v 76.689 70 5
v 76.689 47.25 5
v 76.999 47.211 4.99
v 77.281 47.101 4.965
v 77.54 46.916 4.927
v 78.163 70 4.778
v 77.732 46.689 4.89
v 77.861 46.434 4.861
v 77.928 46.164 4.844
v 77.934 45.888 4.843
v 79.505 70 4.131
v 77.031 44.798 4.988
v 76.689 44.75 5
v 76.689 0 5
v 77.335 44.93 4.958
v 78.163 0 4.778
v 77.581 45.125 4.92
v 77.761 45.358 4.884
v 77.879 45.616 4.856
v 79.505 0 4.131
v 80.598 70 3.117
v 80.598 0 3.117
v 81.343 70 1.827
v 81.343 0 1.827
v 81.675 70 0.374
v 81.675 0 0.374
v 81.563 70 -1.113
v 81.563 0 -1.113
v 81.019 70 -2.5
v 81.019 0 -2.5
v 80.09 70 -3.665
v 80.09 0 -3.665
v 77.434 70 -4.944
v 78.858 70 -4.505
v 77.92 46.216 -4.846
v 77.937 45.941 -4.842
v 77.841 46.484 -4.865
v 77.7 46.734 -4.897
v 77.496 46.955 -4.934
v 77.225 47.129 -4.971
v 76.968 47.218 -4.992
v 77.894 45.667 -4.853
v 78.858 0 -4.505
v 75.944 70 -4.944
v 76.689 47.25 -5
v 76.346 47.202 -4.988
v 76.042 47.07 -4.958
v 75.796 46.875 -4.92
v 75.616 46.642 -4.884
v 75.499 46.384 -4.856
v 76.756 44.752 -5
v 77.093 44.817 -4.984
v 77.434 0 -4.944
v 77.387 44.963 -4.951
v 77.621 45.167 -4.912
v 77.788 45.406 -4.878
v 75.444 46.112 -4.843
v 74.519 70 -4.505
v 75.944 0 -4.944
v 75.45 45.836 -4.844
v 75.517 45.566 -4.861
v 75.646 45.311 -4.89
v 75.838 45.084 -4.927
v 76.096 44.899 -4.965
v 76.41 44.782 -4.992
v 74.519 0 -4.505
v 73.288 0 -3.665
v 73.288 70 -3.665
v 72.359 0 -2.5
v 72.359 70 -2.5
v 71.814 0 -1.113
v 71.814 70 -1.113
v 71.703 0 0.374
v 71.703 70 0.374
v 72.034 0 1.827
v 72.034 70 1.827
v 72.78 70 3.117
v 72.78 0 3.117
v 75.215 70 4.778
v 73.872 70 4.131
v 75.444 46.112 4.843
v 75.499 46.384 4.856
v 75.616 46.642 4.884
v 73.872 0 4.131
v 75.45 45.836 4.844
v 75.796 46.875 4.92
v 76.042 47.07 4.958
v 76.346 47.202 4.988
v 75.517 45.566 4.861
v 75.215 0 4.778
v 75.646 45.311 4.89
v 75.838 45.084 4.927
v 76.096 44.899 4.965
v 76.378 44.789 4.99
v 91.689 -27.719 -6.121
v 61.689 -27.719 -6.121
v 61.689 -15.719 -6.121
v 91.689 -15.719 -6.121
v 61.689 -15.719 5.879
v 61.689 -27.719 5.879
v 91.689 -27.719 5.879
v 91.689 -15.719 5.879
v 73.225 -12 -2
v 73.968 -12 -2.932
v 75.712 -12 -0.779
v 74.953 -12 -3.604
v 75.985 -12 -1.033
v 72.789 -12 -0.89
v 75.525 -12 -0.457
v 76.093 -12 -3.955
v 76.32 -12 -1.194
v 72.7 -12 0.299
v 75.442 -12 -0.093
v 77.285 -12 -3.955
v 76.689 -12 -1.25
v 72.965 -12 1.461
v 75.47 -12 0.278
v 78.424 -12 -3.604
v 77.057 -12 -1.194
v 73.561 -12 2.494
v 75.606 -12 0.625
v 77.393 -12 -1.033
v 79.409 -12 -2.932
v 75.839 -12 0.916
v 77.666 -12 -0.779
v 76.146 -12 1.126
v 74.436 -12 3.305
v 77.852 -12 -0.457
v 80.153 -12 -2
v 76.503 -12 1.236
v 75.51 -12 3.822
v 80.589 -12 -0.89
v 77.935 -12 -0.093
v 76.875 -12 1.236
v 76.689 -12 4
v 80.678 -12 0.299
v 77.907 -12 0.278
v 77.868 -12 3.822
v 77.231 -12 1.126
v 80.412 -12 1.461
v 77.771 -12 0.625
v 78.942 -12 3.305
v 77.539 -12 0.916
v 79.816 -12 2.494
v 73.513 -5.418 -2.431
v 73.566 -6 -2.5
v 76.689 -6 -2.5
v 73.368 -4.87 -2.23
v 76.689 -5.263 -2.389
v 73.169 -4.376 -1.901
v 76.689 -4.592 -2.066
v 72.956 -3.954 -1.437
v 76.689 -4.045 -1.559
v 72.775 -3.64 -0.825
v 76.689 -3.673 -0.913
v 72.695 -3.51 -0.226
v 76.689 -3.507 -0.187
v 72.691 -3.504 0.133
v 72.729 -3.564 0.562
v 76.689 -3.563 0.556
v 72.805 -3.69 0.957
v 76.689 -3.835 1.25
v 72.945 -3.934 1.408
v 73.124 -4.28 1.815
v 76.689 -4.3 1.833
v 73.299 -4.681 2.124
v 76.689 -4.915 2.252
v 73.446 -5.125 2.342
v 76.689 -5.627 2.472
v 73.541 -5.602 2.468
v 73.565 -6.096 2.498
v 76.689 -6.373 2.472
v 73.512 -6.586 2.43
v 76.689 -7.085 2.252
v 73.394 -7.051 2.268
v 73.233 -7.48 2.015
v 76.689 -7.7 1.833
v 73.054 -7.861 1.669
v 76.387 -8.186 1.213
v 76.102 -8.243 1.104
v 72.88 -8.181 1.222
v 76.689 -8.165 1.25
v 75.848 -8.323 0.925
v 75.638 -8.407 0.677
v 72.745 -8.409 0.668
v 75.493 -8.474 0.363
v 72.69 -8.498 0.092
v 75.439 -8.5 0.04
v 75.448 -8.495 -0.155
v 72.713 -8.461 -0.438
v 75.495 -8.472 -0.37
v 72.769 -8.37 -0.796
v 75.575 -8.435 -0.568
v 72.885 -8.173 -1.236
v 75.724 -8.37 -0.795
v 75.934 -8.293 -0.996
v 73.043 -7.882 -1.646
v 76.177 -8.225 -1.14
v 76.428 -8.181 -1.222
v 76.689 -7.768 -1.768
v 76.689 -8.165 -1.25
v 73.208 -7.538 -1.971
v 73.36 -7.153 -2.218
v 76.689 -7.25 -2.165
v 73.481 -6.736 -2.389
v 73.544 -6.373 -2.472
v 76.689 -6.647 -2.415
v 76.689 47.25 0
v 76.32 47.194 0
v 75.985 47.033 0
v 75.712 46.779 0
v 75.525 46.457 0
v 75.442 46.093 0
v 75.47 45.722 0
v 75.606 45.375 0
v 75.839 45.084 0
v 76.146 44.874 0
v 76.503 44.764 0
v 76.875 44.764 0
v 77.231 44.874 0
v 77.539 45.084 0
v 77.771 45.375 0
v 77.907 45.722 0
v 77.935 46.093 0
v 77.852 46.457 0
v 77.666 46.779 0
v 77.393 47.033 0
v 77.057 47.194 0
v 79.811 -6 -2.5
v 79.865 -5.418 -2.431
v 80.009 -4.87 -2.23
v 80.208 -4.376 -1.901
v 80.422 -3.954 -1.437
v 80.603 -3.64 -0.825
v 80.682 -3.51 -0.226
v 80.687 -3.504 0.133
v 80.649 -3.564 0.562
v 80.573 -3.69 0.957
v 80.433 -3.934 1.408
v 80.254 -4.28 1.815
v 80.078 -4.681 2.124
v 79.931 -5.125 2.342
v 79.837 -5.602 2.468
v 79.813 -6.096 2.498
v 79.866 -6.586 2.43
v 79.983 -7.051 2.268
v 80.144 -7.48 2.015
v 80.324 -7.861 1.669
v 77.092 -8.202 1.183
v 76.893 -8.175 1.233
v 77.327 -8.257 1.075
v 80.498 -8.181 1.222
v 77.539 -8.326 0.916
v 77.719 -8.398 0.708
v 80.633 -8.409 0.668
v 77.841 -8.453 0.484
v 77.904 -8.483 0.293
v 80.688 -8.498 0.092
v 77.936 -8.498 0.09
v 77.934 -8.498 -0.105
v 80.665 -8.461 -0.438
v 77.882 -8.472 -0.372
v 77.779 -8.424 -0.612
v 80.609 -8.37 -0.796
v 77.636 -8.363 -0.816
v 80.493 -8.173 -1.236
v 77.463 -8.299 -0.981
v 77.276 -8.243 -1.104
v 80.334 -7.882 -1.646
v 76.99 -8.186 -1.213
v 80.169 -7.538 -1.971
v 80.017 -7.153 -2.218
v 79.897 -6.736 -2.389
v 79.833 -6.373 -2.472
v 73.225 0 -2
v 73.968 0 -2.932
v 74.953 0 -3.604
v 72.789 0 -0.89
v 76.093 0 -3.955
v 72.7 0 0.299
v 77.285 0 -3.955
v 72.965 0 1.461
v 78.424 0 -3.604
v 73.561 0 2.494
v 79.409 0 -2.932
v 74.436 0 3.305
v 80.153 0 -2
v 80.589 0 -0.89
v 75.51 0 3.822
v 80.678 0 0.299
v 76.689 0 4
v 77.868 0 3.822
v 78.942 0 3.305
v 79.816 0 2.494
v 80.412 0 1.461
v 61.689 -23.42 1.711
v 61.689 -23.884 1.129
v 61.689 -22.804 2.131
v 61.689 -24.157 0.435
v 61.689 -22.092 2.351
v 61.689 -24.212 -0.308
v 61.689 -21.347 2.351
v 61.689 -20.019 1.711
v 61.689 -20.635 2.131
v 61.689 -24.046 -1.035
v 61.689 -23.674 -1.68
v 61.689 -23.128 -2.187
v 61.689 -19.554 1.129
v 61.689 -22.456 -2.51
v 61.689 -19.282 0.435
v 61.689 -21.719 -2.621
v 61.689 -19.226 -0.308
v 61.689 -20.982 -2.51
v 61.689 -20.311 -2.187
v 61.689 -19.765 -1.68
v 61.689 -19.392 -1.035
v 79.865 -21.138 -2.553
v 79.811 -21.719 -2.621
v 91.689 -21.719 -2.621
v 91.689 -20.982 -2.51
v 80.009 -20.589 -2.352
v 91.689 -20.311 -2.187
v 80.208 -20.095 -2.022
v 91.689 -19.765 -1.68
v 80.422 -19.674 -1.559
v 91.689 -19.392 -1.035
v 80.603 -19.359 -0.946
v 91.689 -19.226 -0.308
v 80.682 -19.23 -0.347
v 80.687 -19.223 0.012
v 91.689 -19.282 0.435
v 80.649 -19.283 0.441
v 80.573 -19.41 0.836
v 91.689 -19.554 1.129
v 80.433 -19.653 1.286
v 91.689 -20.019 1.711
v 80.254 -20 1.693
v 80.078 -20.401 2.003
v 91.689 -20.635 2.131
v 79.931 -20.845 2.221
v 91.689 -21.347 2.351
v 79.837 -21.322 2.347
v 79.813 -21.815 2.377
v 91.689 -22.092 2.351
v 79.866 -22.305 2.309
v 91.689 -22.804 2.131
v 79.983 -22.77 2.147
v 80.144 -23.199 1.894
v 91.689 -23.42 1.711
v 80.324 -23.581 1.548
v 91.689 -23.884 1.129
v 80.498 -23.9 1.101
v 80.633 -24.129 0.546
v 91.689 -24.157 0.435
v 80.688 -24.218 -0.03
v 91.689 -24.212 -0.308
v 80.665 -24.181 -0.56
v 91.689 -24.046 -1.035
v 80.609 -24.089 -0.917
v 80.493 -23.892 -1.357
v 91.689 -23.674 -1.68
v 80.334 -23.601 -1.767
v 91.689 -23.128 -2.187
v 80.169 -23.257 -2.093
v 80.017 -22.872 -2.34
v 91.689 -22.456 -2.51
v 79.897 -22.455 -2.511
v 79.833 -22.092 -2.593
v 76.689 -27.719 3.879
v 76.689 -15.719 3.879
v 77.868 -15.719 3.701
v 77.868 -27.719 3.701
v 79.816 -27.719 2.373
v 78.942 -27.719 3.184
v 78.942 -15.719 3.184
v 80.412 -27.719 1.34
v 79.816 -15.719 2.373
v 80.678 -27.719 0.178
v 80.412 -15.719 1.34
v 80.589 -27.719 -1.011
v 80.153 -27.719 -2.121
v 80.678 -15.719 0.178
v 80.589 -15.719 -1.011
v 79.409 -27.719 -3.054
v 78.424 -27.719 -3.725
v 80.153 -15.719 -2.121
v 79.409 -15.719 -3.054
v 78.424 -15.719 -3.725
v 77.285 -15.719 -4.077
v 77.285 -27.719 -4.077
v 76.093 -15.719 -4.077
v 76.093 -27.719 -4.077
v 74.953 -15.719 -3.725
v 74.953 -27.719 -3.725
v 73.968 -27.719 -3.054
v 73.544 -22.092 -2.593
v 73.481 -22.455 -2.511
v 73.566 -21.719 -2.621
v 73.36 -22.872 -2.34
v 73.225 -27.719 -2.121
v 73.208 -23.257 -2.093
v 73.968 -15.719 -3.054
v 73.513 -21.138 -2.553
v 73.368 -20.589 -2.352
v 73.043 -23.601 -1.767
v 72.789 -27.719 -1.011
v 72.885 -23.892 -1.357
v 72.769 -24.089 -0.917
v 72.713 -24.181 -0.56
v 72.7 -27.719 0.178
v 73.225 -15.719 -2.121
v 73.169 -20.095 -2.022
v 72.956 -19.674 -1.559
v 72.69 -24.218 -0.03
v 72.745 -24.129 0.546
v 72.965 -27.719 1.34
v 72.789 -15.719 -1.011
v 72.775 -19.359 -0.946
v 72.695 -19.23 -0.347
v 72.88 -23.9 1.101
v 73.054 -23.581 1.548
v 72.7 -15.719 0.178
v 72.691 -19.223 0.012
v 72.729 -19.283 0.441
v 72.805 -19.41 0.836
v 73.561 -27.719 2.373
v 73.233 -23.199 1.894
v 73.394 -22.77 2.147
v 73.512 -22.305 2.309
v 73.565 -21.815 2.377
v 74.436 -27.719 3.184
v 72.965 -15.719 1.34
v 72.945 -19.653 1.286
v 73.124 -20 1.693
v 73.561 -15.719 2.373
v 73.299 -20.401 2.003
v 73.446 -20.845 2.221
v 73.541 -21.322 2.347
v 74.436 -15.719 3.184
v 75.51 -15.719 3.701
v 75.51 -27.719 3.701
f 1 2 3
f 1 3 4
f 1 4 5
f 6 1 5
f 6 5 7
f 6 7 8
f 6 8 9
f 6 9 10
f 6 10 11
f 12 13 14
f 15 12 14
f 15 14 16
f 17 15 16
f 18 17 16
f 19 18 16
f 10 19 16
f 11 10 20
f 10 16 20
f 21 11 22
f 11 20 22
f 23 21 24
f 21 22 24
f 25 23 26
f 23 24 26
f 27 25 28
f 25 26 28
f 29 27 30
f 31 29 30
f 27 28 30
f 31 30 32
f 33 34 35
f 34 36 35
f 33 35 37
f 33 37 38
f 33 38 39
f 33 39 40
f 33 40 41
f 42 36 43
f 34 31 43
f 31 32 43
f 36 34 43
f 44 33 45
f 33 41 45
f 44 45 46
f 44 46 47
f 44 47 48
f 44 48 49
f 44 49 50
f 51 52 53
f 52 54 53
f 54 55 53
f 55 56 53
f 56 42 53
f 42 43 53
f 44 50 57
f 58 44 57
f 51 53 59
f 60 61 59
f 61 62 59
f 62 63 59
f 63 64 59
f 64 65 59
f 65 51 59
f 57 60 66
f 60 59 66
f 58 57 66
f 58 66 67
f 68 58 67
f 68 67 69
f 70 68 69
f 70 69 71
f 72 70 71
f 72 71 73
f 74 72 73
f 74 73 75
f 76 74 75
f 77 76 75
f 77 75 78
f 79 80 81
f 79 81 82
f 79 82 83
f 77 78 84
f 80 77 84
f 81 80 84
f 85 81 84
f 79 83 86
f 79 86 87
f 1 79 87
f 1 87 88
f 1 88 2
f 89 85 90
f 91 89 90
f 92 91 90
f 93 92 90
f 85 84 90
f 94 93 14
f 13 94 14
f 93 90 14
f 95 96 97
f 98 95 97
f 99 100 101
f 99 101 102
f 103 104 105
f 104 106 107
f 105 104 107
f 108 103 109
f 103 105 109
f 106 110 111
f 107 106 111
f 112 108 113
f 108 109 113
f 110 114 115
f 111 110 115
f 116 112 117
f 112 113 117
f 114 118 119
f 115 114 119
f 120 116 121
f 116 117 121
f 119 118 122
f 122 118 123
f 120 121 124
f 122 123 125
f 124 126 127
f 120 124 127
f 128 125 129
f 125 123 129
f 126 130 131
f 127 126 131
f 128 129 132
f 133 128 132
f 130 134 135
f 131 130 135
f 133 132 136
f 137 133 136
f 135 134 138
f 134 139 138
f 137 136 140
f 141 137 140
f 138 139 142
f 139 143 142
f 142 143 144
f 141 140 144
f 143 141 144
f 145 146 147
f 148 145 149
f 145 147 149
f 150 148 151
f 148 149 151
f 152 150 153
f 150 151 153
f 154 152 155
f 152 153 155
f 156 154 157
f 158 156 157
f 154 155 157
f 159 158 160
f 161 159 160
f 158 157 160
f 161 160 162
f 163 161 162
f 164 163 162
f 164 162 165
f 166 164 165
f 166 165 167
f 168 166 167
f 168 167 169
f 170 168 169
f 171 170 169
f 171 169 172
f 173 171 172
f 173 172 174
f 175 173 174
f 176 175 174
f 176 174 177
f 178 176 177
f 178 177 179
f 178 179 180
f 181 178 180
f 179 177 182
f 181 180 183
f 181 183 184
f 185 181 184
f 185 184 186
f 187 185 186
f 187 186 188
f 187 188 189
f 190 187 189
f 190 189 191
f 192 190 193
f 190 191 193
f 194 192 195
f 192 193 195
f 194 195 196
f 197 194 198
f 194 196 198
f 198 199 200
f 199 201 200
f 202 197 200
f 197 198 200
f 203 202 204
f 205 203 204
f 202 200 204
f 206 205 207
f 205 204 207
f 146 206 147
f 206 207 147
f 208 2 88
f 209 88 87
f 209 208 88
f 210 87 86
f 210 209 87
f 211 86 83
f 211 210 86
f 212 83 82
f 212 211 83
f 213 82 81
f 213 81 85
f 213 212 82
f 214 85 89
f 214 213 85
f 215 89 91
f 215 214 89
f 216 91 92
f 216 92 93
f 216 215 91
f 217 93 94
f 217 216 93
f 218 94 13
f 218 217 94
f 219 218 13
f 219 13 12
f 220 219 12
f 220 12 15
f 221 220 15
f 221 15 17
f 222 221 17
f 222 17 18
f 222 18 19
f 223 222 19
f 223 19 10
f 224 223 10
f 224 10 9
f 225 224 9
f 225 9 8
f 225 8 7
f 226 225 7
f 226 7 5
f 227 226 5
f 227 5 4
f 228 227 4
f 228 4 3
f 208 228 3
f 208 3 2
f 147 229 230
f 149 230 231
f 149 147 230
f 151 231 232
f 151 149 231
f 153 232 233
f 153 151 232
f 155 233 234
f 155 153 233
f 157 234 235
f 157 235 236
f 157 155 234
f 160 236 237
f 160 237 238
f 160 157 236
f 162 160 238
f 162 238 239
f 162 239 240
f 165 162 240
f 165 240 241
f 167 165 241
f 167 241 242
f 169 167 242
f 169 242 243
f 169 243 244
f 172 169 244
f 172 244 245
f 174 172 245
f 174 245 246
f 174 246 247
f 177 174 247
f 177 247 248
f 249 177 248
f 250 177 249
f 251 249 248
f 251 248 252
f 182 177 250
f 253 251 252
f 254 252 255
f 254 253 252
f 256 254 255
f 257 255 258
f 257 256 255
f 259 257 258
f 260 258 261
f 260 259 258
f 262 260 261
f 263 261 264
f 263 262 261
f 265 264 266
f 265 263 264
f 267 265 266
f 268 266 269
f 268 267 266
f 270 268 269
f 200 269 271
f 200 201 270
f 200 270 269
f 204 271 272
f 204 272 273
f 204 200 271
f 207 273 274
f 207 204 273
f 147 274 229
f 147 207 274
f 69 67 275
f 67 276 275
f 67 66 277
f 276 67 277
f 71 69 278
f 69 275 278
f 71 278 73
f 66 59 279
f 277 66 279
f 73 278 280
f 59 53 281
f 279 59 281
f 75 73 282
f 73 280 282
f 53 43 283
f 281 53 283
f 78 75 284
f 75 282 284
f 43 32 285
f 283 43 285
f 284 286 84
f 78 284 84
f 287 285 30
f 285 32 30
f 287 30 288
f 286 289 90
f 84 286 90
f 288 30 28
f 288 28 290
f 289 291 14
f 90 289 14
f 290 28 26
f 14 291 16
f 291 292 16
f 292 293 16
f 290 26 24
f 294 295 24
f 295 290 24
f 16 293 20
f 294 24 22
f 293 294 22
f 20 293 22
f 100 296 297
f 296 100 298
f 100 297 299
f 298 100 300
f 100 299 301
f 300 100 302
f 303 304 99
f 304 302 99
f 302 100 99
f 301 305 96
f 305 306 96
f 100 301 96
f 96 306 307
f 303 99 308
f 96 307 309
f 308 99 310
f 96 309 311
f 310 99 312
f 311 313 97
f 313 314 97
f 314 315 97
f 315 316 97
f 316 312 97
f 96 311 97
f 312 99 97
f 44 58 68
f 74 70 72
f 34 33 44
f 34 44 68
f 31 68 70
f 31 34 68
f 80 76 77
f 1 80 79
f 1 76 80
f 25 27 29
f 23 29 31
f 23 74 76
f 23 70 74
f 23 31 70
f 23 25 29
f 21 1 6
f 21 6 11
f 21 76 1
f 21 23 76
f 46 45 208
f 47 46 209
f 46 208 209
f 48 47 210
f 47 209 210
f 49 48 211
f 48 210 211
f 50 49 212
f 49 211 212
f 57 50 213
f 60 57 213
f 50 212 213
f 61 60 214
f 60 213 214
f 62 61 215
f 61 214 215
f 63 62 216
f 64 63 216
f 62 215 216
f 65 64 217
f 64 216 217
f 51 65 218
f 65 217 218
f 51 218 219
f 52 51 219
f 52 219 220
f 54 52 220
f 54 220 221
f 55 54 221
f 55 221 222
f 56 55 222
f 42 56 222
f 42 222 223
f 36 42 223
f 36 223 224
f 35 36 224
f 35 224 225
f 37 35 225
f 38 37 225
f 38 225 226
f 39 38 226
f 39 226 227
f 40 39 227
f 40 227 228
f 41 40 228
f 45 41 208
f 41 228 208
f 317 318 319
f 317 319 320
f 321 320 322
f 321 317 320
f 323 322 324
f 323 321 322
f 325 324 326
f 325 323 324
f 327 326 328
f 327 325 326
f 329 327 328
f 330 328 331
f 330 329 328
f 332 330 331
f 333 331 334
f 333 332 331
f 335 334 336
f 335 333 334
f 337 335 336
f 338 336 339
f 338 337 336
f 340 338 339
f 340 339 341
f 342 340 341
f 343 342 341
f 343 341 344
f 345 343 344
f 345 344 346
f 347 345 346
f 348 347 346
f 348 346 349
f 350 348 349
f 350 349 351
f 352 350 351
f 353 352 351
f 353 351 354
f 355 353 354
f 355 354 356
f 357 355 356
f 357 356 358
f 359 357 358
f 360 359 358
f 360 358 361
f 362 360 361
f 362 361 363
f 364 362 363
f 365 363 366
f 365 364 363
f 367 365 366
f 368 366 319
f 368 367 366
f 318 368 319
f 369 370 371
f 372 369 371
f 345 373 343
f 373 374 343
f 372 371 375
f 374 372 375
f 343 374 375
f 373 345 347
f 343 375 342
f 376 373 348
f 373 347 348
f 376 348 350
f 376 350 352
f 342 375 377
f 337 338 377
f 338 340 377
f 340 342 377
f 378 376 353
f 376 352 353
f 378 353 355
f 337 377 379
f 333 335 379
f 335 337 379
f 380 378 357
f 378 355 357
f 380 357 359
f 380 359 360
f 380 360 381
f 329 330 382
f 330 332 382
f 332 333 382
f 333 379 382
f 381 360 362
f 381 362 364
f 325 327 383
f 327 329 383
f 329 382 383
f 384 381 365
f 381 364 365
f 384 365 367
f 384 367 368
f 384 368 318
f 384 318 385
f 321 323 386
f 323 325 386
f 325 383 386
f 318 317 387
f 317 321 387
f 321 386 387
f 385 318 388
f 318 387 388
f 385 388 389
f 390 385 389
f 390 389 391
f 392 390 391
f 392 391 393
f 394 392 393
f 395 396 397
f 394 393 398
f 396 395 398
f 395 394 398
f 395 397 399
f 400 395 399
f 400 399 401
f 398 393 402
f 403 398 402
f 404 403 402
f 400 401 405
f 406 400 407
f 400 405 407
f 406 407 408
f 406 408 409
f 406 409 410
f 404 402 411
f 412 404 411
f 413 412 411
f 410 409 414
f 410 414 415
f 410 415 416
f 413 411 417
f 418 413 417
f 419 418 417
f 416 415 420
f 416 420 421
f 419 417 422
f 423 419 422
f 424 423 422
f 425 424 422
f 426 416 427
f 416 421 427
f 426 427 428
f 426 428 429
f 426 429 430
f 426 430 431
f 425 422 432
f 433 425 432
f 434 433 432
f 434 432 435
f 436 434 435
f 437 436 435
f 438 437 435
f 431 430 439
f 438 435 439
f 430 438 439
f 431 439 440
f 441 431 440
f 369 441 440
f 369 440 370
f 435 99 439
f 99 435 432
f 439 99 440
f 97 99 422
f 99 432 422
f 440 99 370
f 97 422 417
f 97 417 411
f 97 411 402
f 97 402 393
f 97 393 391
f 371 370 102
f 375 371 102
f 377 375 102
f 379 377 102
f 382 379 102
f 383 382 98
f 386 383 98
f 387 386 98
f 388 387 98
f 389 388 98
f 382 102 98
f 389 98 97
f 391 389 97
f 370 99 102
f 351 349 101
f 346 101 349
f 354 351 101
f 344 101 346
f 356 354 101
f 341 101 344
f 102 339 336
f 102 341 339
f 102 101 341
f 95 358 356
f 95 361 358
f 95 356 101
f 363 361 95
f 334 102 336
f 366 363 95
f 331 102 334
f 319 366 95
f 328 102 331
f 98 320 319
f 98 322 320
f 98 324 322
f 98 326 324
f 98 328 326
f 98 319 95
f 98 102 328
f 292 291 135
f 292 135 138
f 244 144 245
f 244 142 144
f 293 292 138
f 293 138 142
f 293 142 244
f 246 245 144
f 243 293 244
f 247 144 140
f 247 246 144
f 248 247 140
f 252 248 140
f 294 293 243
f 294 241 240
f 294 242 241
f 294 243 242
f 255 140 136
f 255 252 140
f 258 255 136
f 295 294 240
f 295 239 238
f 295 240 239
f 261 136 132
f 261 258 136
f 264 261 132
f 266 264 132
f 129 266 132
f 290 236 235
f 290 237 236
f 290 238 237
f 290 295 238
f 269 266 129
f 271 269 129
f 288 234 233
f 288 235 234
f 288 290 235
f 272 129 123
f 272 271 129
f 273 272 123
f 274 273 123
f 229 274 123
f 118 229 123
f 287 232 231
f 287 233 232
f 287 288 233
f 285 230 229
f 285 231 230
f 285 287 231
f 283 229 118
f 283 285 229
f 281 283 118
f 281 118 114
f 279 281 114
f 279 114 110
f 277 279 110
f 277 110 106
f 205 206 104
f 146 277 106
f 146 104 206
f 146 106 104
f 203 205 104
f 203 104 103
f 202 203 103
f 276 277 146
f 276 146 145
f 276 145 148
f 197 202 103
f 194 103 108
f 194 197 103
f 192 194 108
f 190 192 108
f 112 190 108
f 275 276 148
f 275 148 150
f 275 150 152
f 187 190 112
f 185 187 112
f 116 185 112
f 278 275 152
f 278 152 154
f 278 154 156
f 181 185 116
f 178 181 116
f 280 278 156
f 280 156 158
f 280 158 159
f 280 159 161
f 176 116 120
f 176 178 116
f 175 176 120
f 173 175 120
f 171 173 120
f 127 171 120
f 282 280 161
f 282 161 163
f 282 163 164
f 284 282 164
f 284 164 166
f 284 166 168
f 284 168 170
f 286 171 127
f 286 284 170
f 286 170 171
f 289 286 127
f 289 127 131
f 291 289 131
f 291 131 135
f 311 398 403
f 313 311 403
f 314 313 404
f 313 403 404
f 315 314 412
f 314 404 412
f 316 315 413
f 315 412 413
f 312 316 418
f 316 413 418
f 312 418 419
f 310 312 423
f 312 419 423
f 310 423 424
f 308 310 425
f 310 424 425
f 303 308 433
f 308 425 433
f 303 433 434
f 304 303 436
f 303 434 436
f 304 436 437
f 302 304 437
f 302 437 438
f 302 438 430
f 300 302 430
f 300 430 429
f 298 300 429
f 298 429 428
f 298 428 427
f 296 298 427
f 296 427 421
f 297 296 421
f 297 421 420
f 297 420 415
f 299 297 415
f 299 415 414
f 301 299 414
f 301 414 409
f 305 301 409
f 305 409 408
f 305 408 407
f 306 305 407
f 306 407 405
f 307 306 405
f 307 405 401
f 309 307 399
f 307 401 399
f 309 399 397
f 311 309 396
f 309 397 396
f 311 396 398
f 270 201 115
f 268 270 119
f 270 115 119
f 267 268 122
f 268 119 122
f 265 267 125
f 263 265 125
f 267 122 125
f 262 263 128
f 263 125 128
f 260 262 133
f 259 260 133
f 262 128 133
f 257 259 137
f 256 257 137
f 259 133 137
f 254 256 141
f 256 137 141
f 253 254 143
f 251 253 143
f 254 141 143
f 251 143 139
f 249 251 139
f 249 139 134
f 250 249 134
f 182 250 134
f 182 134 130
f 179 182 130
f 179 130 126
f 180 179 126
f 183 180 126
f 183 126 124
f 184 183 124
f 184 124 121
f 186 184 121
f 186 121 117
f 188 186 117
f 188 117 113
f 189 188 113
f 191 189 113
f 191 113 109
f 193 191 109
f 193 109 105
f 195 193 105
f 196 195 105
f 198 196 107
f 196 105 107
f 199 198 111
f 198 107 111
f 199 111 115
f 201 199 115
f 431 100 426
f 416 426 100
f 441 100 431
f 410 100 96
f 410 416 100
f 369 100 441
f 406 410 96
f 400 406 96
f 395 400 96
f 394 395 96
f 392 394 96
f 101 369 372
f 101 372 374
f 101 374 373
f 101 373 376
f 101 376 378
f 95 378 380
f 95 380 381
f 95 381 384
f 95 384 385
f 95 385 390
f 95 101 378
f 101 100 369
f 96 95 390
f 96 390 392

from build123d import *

# Parameters (mm, degrees)
ESQUISSE5_R                  = 4
BOSS_EXTRU_3_DEPTH           = 12
ESQUISSE6_R                  = 5
BOSS_EXTRU_4_DEPTH           = 70
ESQUISSE7_R                  = 2.5
ENL_V_MAT_EXTRU_3_DEPTH      = 10
ENL_V_MAT_EXTRU_3_DEPTH_BACK = 10
ESQUISSE8_R                  = 1.25
ENL_V_MAT_EXTRU_4_DEPTH      = 4
ESQUISSE9_W                  = 12
ESQUISSE9_H                  = 12
ESQUISSE9_R                  = 2.5
BOSS_EXTRU_5_DEPTH           = 15
BOSS_EXTRU_5_DEPTH_BACK      = 15
ESQUISSE10_R                 = 4
ENL_V_MAT_EXTRU_5_DEPTH      = 15
ESQUISSE11_R                 = 1.25
ENL_V_MAT_EXTRU_6_DEPTH      = 10
ENL_V_MAT_EXTRU_6_DEPTH_BACK = 10


with BuildPart() as part:
    # Esquisse5 → Boss.-Extru.3 (new body)
    with BuildSketch(Plane(origin=(0, 0, 0), x_dir=(1, 0, 0), z_dir=(0, 1, 0))):
        with Locations(Location((76.688805558, 0, 0), (0, 0, 270))):  # turned: the seam where the file's is
            Circle(ESQUISSE5_R)
    extrude(amount=-BOSS_EXTRU_3_DEPTH)

    # Esquisse6 → Boss.-Extru.4 (add)
    with BuildSketch(Plane(origin=(0, 0, 0), x_dir=(1, 0, 0), z_dir=(0, 1, 0))):
        with Locations(Location((76.688805558, 0, 0), (0, 0, 270))):  # turned: the seam where the file's is
            Circle(ESQUISSE6_R)
    extrude(amount=BOSS_EXTRU_4_DEPTH)

    # Esquisse7 → Enl_v. mat.-Extru.3 (cut, two sides)
    with BuildSketch(Plane(origin=(76.688805558, 0, 0), x_dir=(0, 0, -1), z_dir=(1, 0, 0))) as enl_v_mat_extru_3_sk:
        with Locations((0, -6)):
            Circle(ESQUISSE7_R)
    extrude(amount=ENL_V_MAT_EXTRU_3_DEPTH, mode=Mode.SUBTRACT)
    extrude(enl_v_mat_extru_3_sk.sketch, amount=-ENL_V_MAT_EXTRU_3_DEPTH_BACK, mode=Mode.SUBTRACT)

    # Esquisse8 → Enl_v. mat.-Extru.4 (cut)
    with BuildSketch(Plane.XZ.offset(12)):
        with Locations(Location((76.688805558, 0, 0), (0, 0, 270))):  # turned: the seam where the file's is
            Circle(ESQUISSE8_R)
    extrude(amount=-ENL_V_MAT_EXTRU_4_DEPTH, mode=Mode.SUBTRACT)

    # Esquisse11 → Enl_v. mat.-Extru.6 (cut, two sides)
    with BuildSketch(Plane.XY) as enl_v_mat_extru_6_sk:
        with Locations(Location((76.688805558, 46, 0), (0, 0, 89.999999996))):  # turned: the seam where the file's is
            Circle(ESQUISSE11_R)
    extrude(amount=ENL_V_MAT_EXTRU_6_DEPTH, mode=Mode.SUBTRACT)
    extrude(enl_v_mat_extru_6_sk.sketch, amount=-ENL_V_MAT_EXTRU_6_DEPTH_BACK, mode=Mode.SUBTRACT)


with BuildPart() as body_2:
    # Esquisse9 → Boss.-Extru.5 (new body, two sides)
    with BuildSketch(Plane(origin=(76.688805558, 0, 0), x_dir=(0, 0, -1), z_dir=(1, 0, 0))) as boss_extru_5_sk:
        with Locations((0.121410783, -21.719272195)):
            Rectangle(ESQUISSE9_W, ESQUISSE9_H)
        with Locations((0.121410783, -21.719272195)):
            Circle(ESQUISSE9_R, mode=Mode.SUBTRACT)
    extrude(amount=BOSS_EXTRU_5_DEPTH)
    extrude(boss_extru_5_sk.sketch, amount=-BOSS_EXTRU_5_DEPTH_BACK)

    # Esquisse10 → Enl_v. mat.-Extru.5 (cut)
    with BuildSketch(Plane(origin=(0, -15.719272195, 0), x_dir=(1, 0, 0), z_dir=(0, 1, 0))):
        with Locations(Location((76.688805558, 0.121410783, 0), (0, 0, 270))):  # turned: the seam where the file's is
            Circle(ESQUISSE10_R)
    extrude(amount=-ENL_V_MAT_EXTRU_5_DEPTH, mode=Mode.SUBTRACT)


solid = Compound([part.part, body_2.part])
